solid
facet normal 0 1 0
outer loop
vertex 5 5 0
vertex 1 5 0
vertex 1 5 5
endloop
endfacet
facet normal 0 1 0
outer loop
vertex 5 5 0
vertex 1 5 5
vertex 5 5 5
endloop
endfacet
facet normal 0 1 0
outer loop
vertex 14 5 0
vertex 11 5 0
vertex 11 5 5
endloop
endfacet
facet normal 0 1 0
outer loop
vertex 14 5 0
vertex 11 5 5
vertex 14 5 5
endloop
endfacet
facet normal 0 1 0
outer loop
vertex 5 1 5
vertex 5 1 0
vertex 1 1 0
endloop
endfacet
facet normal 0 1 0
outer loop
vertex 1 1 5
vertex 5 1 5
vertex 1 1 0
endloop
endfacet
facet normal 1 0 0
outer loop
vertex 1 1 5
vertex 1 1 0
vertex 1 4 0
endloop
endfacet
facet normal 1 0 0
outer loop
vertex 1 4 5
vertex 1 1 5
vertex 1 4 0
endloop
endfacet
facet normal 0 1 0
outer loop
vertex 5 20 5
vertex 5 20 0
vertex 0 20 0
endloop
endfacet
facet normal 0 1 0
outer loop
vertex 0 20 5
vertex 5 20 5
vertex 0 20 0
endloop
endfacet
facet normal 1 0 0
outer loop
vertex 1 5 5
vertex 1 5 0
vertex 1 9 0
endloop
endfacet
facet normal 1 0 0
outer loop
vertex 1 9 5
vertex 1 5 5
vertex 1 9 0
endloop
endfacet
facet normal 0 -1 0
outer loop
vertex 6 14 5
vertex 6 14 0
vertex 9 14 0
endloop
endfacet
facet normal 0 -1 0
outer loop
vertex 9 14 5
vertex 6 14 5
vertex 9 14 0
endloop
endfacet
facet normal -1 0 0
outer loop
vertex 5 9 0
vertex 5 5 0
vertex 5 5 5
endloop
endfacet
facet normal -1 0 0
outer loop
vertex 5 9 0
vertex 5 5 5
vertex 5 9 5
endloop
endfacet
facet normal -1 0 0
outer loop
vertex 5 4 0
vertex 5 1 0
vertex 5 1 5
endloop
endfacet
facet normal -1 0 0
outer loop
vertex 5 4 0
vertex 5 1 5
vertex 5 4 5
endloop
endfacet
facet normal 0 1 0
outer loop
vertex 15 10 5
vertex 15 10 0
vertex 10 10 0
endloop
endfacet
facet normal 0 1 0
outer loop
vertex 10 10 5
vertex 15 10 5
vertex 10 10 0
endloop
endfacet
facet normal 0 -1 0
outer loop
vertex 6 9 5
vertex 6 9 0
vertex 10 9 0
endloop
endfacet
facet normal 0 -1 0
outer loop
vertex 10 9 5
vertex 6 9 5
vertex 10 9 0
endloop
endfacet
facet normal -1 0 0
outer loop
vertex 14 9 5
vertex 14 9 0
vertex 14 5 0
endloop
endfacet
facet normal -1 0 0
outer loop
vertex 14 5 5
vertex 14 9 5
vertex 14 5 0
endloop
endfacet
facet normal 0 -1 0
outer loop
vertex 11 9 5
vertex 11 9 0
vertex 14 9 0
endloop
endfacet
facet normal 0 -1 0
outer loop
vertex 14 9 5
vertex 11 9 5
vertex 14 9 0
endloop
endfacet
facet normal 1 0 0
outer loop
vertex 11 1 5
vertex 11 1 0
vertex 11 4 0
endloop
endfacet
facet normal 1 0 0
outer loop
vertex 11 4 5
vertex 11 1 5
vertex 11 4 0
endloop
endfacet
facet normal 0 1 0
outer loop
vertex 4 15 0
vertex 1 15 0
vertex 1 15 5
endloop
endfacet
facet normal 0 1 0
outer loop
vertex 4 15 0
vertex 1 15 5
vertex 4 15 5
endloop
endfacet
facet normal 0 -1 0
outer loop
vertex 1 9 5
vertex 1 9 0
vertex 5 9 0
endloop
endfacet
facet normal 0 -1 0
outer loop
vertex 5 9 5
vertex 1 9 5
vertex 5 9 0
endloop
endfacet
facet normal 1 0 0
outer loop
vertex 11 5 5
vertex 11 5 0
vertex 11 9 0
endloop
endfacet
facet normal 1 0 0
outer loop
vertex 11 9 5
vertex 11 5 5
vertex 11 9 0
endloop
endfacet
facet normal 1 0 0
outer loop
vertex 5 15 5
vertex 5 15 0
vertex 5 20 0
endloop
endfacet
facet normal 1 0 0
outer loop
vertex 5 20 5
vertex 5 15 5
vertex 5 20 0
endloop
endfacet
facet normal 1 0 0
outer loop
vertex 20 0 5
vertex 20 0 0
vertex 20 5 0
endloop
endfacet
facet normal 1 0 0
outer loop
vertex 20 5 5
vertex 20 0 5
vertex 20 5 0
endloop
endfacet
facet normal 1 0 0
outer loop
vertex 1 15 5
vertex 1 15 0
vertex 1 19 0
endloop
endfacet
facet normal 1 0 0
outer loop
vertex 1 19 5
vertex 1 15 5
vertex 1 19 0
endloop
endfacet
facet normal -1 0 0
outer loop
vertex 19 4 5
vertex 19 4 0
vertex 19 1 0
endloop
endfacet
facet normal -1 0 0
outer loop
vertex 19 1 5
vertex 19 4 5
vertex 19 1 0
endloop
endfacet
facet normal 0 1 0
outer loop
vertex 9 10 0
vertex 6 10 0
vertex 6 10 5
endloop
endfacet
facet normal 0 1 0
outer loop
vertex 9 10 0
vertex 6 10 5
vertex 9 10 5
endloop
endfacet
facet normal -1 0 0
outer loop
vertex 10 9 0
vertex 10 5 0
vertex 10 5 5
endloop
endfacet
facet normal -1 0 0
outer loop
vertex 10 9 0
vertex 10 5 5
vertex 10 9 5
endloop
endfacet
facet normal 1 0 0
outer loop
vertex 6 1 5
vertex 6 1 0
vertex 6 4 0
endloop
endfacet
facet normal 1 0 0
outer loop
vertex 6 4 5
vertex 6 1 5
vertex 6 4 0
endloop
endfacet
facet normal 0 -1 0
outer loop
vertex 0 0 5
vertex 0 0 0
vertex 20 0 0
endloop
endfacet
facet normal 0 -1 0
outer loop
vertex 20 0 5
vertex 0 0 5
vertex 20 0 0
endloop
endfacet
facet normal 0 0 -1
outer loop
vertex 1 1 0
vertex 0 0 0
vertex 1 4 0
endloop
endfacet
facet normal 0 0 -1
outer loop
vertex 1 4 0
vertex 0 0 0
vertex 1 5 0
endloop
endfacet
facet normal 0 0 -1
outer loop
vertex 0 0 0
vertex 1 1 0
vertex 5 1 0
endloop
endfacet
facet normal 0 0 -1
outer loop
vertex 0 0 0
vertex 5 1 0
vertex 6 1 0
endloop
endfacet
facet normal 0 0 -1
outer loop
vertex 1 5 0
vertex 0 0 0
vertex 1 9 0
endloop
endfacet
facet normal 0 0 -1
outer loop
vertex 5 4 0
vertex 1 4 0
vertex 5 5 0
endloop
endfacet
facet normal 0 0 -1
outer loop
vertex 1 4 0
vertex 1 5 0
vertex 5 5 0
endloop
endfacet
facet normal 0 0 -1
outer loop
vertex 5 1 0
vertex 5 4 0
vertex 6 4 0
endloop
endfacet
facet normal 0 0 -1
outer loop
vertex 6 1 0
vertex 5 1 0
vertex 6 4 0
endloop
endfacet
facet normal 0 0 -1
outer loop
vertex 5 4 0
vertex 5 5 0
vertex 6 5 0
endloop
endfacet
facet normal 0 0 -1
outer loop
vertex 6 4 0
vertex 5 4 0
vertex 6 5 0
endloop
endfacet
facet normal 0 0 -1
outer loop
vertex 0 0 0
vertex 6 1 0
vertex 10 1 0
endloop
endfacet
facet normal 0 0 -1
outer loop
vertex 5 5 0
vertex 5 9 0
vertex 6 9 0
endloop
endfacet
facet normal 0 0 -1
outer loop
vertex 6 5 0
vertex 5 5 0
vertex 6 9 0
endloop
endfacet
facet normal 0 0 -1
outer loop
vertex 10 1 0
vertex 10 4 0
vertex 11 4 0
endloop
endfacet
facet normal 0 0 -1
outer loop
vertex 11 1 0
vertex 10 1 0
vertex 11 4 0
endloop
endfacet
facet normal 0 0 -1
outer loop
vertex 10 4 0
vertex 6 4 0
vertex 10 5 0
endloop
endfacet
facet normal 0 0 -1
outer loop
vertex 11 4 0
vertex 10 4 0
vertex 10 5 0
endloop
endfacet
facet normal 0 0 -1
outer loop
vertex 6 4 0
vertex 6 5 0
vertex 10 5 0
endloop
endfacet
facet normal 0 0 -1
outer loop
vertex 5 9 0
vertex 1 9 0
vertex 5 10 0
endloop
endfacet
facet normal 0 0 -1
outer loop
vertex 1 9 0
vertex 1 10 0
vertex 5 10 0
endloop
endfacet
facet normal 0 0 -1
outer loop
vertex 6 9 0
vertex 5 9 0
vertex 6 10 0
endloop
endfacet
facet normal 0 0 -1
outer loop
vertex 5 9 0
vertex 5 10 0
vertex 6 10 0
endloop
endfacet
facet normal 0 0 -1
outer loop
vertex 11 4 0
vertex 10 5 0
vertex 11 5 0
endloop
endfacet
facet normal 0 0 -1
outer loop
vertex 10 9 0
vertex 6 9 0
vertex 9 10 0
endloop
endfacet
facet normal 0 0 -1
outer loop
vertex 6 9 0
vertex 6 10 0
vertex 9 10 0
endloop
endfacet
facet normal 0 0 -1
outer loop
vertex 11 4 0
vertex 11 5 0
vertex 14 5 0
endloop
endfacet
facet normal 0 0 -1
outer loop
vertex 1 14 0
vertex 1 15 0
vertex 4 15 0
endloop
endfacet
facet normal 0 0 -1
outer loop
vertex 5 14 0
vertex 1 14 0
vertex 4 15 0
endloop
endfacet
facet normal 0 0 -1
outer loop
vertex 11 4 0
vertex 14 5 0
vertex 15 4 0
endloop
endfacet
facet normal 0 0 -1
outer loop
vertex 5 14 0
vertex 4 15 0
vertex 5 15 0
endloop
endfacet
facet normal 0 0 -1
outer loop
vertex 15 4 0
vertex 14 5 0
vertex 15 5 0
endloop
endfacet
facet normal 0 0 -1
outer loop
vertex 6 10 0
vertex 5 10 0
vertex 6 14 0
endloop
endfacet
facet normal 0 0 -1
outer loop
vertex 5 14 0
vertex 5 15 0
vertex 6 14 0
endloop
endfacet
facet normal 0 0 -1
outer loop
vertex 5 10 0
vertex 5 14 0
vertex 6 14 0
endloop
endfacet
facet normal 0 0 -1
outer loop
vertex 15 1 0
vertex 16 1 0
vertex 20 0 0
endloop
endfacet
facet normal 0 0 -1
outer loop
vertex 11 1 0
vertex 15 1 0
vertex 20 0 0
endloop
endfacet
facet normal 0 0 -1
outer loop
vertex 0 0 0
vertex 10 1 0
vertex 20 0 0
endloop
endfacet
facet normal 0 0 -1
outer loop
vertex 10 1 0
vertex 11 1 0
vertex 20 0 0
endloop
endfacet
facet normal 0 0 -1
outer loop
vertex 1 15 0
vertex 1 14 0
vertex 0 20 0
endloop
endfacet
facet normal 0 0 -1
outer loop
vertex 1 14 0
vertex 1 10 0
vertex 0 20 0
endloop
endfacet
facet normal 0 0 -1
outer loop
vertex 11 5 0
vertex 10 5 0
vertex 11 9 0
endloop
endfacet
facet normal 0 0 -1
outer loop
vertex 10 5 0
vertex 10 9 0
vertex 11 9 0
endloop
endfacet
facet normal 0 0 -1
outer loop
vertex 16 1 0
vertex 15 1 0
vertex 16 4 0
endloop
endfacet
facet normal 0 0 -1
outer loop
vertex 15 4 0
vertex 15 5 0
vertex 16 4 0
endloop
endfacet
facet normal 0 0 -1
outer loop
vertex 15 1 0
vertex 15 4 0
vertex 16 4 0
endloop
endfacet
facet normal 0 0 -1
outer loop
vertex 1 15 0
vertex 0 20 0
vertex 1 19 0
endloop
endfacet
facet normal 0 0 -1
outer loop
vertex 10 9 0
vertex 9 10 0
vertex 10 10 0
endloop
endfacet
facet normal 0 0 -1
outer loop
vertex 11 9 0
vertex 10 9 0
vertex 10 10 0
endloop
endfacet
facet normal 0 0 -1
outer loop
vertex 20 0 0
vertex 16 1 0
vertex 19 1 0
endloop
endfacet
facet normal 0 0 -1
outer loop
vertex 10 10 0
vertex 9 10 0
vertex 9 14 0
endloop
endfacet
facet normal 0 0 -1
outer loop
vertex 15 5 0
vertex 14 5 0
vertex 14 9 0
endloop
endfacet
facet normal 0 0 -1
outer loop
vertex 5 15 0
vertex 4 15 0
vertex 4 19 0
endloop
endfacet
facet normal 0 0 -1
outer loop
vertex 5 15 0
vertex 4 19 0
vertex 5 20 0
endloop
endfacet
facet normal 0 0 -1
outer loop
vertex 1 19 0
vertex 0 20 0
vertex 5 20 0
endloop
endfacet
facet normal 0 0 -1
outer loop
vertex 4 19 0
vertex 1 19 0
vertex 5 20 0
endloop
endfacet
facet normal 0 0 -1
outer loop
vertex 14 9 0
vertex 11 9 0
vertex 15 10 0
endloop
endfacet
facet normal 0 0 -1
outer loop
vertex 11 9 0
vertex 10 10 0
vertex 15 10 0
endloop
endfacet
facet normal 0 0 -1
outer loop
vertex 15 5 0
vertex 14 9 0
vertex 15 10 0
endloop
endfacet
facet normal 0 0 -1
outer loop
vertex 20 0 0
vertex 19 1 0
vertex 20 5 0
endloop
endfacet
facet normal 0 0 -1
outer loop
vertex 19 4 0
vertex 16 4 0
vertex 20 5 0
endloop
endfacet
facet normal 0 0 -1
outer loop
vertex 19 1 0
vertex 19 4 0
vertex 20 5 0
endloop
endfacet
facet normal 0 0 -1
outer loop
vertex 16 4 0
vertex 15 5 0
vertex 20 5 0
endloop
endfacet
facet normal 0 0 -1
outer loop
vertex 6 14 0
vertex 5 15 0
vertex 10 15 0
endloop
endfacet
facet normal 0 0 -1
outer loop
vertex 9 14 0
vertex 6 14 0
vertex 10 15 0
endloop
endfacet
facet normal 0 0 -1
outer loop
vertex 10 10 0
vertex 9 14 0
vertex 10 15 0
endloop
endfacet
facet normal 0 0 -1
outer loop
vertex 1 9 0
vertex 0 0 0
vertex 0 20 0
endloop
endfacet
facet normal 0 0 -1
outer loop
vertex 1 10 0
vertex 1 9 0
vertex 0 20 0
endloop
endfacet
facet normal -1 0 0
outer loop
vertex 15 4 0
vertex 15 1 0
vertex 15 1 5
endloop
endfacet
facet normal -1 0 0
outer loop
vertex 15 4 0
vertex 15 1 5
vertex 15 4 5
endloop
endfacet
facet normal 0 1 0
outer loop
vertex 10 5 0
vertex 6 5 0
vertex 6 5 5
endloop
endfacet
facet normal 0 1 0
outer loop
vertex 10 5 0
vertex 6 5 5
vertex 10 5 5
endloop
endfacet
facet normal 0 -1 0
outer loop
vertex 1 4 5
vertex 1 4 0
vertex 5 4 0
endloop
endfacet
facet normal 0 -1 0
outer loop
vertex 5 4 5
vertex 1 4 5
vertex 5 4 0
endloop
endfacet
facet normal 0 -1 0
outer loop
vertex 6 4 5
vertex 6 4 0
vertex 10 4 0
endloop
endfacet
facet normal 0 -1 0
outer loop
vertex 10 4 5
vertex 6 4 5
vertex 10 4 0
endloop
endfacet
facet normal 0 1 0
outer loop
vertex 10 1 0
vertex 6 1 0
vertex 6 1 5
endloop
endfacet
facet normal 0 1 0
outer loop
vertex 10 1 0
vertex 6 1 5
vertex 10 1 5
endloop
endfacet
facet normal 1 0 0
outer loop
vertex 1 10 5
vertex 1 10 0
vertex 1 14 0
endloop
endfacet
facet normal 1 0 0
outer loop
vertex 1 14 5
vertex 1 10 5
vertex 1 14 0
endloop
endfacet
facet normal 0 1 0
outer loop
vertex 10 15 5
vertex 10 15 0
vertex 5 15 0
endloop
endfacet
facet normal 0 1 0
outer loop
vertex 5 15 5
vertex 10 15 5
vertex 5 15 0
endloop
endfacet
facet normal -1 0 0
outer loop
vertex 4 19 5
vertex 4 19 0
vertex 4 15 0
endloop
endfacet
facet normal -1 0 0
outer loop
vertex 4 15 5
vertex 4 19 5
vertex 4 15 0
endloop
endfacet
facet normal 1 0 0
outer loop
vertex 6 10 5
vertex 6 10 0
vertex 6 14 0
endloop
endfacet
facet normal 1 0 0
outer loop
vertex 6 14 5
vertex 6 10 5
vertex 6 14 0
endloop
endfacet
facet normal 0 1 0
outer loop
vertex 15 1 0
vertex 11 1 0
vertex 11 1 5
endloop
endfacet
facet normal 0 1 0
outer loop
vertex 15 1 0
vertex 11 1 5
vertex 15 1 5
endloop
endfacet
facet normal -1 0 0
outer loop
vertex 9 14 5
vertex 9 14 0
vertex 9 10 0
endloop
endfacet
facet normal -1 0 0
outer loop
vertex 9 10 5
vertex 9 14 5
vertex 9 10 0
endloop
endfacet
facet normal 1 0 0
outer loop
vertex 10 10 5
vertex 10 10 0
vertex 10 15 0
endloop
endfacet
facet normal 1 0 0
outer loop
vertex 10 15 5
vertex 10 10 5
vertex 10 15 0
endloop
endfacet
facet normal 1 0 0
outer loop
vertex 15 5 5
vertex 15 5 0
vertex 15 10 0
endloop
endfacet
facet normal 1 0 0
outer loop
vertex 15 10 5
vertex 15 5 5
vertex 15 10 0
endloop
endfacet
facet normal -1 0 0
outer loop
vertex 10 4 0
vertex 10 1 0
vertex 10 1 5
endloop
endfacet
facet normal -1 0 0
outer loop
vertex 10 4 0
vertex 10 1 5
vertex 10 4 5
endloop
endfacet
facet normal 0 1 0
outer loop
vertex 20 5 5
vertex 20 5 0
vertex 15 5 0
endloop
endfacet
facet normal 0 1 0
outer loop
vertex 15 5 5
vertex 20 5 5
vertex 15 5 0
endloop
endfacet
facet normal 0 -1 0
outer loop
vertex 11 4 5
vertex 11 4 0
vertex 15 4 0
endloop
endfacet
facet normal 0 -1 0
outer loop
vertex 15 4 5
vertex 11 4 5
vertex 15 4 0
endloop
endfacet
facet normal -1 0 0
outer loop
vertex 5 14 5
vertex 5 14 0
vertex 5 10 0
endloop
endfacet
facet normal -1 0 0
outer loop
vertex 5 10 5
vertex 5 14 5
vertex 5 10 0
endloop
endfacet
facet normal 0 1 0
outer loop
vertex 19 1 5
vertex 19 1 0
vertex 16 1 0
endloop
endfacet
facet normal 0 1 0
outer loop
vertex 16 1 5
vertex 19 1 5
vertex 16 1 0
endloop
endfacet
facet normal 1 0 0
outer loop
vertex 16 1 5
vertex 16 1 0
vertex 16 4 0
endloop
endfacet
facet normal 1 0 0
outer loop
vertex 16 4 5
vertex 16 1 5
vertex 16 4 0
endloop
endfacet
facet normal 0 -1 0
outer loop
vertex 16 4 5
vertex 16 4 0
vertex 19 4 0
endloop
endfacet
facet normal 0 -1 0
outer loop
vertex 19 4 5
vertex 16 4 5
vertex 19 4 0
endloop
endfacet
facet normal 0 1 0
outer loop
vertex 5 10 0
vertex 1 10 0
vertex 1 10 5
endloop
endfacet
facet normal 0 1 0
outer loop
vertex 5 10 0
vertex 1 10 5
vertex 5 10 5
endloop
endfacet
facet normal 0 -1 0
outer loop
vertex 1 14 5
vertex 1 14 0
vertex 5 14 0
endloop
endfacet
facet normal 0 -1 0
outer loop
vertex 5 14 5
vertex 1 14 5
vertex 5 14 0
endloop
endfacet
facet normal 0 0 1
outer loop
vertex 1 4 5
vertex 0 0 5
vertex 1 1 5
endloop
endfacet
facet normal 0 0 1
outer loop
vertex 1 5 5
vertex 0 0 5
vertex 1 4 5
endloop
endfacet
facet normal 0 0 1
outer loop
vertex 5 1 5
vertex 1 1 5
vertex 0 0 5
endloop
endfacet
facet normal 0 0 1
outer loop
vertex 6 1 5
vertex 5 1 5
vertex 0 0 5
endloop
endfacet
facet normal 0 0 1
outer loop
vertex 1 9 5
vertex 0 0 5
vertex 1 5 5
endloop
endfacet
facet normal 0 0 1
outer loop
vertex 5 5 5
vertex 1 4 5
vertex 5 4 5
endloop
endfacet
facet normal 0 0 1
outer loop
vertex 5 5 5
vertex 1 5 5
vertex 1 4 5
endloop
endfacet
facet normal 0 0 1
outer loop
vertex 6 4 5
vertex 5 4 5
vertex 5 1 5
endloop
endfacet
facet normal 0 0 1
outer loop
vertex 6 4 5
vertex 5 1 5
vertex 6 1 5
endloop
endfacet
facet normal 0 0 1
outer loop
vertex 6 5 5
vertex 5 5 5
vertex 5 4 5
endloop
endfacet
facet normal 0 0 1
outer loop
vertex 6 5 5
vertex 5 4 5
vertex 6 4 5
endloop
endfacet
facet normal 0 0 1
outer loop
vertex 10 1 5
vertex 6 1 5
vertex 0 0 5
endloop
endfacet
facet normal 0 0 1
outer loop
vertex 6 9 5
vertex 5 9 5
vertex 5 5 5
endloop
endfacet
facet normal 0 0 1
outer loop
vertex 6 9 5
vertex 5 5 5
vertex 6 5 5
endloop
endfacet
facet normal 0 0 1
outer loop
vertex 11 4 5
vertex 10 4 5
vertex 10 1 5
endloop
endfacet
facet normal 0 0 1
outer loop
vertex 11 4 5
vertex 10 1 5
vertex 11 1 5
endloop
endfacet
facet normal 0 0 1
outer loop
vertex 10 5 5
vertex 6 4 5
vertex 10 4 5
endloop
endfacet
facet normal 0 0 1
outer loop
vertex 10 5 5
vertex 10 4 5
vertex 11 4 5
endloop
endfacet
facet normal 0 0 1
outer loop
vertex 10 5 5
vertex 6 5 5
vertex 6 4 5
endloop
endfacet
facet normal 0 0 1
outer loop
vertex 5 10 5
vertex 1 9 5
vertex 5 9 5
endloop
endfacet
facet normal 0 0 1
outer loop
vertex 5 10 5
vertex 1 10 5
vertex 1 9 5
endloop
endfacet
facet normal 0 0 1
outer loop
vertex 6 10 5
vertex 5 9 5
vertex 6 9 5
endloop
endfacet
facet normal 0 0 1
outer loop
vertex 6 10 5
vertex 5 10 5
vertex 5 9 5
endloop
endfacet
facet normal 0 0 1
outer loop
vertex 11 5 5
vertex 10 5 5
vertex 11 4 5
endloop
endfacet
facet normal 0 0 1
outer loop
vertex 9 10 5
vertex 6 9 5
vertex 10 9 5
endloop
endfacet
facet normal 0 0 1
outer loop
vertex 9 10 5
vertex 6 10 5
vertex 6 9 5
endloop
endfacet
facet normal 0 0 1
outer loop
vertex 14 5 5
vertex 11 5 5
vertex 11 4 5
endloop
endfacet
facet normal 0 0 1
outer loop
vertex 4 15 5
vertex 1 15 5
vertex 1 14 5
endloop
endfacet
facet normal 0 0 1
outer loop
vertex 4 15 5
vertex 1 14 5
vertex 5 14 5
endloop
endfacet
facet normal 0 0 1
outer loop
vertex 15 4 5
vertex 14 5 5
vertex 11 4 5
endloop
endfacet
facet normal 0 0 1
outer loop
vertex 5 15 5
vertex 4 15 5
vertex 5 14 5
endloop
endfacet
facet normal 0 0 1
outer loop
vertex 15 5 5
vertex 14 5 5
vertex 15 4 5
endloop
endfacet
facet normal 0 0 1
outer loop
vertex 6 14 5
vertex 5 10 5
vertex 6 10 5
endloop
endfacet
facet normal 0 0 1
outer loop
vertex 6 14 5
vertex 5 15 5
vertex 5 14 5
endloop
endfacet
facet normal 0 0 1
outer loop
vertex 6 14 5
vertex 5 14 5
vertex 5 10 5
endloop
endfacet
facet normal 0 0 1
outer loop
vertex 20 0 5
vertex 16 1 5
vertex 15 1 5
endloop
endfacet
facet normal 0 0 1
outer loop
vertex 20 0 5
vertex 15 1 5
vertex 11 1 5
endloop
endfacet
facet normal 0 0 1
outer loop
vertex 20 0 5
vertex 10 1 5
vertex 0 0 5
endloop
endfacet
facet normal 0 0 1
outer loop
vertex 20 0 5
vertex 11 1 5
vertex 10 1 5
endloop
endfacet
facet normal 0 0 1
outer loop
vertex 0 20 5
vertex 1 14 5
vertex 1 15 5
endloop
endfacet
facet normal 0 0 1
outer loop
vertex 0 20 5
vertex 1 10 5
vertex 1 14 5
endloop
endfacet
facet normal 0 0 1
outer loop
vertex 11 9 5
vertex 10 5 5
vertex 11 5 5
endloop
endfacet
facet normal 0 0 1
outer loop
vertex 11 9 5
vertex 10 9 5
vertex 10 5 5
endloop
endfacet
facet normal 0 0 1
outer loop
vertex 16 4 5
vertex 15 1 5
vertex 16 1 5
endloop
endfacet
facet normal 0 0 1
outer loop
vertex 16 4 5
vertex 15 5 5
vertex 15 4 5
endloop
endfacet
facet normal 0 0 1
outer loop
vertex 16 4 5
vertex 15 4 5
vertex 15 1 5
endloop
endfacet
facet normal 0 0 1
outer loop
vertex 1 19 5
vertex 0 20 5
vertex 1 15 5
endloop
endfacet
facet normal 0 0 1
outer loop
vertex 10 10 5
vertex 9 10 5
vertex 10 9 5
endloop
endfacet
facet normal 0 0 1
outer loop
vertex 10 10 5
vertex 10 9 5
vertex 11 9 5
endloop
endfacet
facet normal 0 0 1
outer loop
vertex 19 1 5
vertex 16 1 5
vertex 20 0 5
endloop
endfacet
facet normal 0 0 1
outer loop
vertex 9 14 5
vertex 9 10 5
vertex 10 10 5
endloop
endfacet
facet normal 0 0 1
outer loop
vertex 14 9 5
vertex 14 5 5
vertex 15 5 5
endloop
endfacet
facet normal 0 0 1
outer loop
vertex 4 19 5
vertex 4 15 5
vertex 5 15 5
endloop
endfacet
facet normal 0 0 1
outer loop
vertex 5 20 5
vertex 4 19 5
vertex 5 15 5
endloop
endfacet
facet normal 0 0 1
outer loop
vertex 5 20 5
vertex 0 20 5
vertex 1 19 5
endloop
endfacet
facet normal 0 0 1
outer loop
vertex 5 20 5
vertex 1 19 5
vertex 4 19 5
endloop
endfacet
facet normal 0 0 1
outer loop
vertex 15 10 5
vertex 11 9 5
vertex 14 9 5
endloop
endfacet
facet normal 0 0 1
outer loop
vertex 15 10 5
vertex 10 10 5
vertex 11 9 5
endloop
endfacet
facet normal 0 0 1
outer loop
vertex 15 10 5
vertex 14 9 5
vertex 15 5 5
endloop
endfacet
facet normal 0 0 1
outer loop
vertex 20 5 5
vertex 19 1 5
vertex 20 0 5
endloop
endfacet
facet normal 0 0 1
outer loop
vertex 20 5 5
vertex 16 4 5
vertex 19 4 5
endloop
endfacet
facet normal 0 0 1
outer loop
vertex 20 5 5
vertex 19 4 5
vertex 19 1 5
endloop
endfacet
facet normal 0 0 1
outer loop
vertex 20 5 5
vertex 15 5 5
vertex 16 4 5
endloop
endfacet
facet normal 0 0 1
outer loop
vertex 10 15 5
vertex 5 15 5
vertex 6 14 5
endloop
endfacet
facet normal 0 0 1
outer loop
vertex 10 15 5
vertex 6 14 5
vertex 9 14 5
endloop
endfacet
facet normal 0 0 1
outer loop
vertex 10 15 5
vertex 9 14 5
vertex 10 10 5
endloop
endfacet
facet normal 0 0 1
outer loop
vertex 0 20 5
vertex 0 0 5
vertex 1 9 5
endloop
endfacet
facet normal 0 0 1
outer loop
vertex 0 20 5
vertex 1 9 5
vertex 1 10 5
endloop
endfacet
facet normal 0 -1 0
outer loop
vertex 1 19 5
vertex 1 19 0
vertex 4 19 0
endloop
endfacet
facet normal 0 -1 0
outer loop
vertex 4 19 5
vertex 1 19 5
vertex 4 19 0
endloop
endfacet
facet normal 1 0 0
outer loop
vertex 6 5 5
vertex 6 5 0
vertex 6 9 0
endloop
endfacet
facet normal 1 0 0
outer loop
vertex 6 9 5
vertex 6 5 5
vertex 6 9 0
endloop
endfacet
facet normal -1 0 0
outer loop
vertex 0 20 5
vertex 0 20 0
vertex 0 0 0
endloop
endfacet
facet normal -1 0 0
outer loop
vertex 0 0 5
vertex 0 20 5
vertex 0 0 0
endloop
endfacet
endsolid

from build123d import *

# Parameters (mm, degrees)
F0_W     = 1
F0_H     = 1
F0_H_2   = 4
F0_W_2   = 4
F0_H_3   = 3
F0_W_3   = 3
F1_DEPTH = 5


with BuildPart() as f1:
    # F0 (on Top) → F1 (new body)
    with BuildSketch(Plane.XY):
        Polygon((0, 20), (0, 0), (5, 0), (5, 1), (1, 1), (1, 4), (1, 5), (1, 9), (1, 10), (1, 14), (1, 15), (1, 19), (4, 19), (4, 15), (4, 14), (5, 14), (5, 15), (5, 20), align=None)
        with Locations((5.5, 14.5)):
            Rectangle(F0_W, F0_H)
        Polygon((10, 15), (6, 15), (6, 14), (9, 14), (9, 10), (9, 9), (10, 9), (10, 10), align=None)
        with Locations((10.5, 9.5)):
            Rectangle(F0_W, F0_H)
        Polygon((15, 10), (11, 10), (11, 9), (14, 9), (14, 5), (14, 4), (15, 4), (15, 5), align=None)
        with Locations((10.5, 7)):
            Rectangle(F0_W, F0_H_2)
        with Locations((5.5, 9.5)):
            Rectangle(F0_W, F0_H)
        with Locations((5.5, 12)):
            Rectangle(F0_W, F0_H_2)
        with Locations((3, 9.5)):
            Rectangle(F0_W_2, F0_H)
        with Locations((5.5, 7)):
            Rectangle(F0_W, F0_H_2)
        with Locations((3, 4.5)):
            Rectangle(F0_W_2, F0_H)
        with Locations((5.5, 2.5)):
            Rectangle(F0_W, F0_H_3)
        with Locations((5.5, 4.5)):
            Rectangle(F0_W, F0_H)
        with Locations((5.5, 0.5)):
            Rectangle(F0_W, F0_H)
        with Locations((8, 0.5)):
            Rectangle(F0_W_2, F0_H)
        with Locations((8, 4.5)):
            Rectangle(F0_W_2, F0_H)
        with Locations((10.5, 4.5)):
            Rectangle(F0_W, F0_H)
        with Locations((10.5, 2.5)):
            Rectangle(F0_W, F0_H_3)
        with Locations((10.5, 0.5)):
            Rectangle(F0_W, F0_H)
        with Locations((13, 0.5)):
            Rectangle(F0_W_2, F0_H)
        with Locations((12.5, 4.5)):
            Rectangle(F0_W_3, F0_H)
        with Locations((15.5, 4.5)):
            Rectangle(F0_W, F0_H)
        with Locations((15.5, 2.5)):
            Rectangle(F0_W, F0_H_3)
        with Locations((15.5, 0.5)):
            Rectangle(F0_W, F0_H)
        Polygon((16, 1), (16, 0), (20, 0), (20, 5), (16, 5), (16, 4), (19, 4), (19, 1), align=None)
        with Locations((7.5, 9.5)):
            Rectangle(F0_W_3, F0_H)
        with Locations((2.5, 14.5)):
            Rectangle(F0_W_3, F0_H)
    extrude(amount=F1_DEPTH)


solid = f1.part
